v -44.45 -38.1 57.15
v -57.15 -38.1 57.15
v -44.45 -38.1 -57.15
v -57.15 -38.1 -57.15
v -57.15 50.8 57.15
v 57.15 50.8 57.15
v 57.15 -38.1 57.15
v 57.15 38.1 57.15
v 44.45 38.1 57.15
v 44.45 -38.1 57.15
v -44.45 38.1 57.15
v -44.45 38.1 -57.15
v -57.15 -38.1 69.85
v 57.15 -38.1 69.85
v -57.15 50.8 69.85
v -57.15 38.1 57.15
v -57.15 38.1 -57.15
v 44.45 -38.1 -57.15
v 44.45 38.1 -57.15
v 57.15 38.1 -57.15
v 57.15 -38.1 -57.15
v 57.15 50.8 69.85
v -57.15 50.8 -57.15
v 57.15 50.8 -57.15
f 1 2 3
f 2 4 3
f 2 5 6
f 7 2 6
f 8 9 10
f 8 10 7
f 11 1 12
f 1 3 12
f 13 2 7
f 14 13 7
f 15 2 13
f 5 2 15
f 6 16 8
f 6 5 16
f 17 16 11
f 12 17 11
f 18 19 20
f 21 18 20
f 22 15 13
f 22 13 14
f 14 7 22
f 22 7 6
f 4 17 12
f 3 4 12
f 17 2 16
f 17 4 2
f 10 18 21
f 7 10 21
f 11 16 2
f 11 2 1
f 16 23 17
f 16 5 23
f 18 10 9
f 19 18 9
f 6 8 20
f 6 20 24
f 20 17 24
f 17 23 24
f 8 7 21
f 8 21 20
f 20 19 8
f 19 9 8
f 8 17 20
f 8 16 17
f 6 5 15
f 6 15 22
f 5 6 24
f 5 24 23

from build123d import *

# Parameters (mm, degrees)
F0_W     = 12.7
F0_H     = 76.2
F1_DEPTH = 57.15
F2_DEPTH = 57.15
F3_W     = 114.3
F3_H     = 88.9
F4_DEPTH = 12.7


with BuildPart() as f1:
    # F0 (on Top) → F1 (new body, symmetric)
    with BuildSketch(Plane.XY):
        with Locations((-50.8, 0)):
            Rectangle(F0_W, F0_H)
        with Locations((50.8, 0)):
            Rectangle(F0_W, F0_H)
    extrude(amount=F1_DEPTH, both=True)


with BuildPart() as f2:
    # F0 (on Top) → F2 (new body, symmetric)
    with BuildSketch(Plane.XY):
        Polygon((-57.15, 38.1), (-44.45, 38.1), (44.45, 38.1), (57.15, 38.1), (57.15, 50.8), (-57.15, 50.8), align=None)
    extrude(amount=F2_DEPTH, both=True)


with BuildPart() as f4:
    # F3 (on face) → F4 (new body)
    with BuildSketch(Plane.XY.offset(57.15)):
        with Locations((0, 6.35)):
            Rectangle(F3_W, F3_H)
    extrude(amount=F4_DEPTH)


solid = Compound([f1.part, f2.part, f4.part])
